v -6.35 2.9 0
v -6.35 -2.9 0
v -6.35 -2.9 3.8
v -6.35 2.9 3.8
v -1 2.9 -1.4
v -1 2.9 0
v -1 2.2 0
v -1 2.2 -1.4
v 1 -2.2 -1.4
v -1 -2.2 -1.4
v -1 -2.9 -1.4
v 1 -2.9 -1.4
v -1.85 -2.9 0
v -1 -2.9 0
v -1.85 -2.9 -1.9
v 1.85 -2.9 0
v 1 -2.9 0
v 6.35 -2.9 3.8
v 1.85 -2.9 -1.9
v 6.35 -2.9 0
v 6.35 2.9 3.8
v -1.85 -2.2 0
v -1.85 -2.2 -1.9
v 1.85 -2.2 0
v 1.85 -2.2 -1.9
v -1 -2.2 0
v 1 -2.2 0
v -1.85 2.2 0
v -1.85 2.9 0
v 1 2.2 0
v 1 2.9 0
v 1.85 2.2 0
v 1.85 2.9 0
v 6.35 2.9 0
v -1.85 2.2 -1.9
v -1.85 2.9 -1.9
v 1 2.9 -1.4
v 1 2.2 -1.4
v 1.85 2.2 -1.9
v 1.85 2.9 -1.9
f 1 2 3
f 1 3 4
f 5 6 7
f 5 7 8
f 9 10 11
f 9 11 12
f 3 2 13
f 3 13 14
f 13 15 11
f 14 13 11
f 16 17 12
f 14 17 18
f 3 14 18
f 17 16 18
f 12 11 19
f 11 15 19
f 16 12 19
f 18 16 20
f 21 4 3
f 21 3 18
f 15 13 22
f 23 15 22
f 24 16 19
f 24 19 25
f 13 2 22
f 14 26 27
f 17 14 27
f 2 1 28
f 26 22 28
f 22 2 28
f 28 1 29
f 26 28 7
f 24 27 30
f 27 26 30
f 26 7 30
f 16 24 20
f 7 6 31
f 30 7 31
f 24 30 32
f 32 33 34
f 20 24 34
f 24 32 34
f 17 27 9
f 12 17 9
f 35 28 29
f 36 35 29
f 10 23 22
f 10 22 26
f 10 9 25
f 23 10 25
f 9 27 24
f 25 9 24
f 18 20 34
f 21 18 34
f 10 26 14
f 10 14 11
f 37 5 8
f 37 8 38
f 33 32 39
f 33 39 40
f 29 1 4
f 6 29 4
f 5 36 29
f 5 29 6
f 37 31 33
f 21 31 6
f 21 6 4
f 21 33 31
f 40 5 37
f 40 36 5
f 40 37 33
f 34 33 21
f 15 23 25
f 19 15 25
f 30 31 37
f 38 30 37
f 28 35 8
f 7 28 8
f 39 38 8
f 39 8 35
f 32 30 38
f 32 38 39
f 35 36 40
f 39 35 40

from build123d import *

# Parameters (mm, degrees)
CROQUIS1_W              = 12.7
CROQUIS1_H              = 5.8
SALIENTE_EXTRUIR1_DEPTH = 3.8
CROQUIS2_W              = 3.7
CROQUIS2_H              = 0.7
SALIENTE_EXTRUIR2_DEPTH = 1.9
CROQUIS3_W              = 2
CROQUIS3_H              = 1.4
CORTAR_EXTRUIR1_DEPTH   = 2.95


with BuildPart() as part:
    # Croquis1 → Saliente-Extruir1 (new body)
    with BuildSketch(Plane.XY):
        Rectangle(CROQUIS1_W, CROQUIS1_H)
    extrude(amount=SALIENTE_EXTRUIR1_DEPTH)

    # Croquis2 → Saliente-Extruir2 (add)
    with BuildSketch(Plane.XY):
        with Locations((0, 2.55)):
            Rectangle(CROQUIS2_W, CROQUIS2_H)
        with Locations((0, -2.55)):
            Rectangle(CROQUIS2_W, CROQUIS2_H)
    extrude(amount=-SALIENTE_EXTRUIR2_DEPTH)

    # Croquis3 → Cortar-Extruir1 (cut, symmetric)
    with BuildSketch(Plane(origin=(0, 0, 0), x_dir=(1, 0, 0), z_dir=(0, 1, 0))):
        with Locations((0, 0.7)):
            Rectangle(CROQUIS3_W, CROQUIS3_H)
    extrude(amount=CORTAR_EXTRUIR1_DEPTH, both=True, mode=Mode.SUBTRACT)


solid = part.part
